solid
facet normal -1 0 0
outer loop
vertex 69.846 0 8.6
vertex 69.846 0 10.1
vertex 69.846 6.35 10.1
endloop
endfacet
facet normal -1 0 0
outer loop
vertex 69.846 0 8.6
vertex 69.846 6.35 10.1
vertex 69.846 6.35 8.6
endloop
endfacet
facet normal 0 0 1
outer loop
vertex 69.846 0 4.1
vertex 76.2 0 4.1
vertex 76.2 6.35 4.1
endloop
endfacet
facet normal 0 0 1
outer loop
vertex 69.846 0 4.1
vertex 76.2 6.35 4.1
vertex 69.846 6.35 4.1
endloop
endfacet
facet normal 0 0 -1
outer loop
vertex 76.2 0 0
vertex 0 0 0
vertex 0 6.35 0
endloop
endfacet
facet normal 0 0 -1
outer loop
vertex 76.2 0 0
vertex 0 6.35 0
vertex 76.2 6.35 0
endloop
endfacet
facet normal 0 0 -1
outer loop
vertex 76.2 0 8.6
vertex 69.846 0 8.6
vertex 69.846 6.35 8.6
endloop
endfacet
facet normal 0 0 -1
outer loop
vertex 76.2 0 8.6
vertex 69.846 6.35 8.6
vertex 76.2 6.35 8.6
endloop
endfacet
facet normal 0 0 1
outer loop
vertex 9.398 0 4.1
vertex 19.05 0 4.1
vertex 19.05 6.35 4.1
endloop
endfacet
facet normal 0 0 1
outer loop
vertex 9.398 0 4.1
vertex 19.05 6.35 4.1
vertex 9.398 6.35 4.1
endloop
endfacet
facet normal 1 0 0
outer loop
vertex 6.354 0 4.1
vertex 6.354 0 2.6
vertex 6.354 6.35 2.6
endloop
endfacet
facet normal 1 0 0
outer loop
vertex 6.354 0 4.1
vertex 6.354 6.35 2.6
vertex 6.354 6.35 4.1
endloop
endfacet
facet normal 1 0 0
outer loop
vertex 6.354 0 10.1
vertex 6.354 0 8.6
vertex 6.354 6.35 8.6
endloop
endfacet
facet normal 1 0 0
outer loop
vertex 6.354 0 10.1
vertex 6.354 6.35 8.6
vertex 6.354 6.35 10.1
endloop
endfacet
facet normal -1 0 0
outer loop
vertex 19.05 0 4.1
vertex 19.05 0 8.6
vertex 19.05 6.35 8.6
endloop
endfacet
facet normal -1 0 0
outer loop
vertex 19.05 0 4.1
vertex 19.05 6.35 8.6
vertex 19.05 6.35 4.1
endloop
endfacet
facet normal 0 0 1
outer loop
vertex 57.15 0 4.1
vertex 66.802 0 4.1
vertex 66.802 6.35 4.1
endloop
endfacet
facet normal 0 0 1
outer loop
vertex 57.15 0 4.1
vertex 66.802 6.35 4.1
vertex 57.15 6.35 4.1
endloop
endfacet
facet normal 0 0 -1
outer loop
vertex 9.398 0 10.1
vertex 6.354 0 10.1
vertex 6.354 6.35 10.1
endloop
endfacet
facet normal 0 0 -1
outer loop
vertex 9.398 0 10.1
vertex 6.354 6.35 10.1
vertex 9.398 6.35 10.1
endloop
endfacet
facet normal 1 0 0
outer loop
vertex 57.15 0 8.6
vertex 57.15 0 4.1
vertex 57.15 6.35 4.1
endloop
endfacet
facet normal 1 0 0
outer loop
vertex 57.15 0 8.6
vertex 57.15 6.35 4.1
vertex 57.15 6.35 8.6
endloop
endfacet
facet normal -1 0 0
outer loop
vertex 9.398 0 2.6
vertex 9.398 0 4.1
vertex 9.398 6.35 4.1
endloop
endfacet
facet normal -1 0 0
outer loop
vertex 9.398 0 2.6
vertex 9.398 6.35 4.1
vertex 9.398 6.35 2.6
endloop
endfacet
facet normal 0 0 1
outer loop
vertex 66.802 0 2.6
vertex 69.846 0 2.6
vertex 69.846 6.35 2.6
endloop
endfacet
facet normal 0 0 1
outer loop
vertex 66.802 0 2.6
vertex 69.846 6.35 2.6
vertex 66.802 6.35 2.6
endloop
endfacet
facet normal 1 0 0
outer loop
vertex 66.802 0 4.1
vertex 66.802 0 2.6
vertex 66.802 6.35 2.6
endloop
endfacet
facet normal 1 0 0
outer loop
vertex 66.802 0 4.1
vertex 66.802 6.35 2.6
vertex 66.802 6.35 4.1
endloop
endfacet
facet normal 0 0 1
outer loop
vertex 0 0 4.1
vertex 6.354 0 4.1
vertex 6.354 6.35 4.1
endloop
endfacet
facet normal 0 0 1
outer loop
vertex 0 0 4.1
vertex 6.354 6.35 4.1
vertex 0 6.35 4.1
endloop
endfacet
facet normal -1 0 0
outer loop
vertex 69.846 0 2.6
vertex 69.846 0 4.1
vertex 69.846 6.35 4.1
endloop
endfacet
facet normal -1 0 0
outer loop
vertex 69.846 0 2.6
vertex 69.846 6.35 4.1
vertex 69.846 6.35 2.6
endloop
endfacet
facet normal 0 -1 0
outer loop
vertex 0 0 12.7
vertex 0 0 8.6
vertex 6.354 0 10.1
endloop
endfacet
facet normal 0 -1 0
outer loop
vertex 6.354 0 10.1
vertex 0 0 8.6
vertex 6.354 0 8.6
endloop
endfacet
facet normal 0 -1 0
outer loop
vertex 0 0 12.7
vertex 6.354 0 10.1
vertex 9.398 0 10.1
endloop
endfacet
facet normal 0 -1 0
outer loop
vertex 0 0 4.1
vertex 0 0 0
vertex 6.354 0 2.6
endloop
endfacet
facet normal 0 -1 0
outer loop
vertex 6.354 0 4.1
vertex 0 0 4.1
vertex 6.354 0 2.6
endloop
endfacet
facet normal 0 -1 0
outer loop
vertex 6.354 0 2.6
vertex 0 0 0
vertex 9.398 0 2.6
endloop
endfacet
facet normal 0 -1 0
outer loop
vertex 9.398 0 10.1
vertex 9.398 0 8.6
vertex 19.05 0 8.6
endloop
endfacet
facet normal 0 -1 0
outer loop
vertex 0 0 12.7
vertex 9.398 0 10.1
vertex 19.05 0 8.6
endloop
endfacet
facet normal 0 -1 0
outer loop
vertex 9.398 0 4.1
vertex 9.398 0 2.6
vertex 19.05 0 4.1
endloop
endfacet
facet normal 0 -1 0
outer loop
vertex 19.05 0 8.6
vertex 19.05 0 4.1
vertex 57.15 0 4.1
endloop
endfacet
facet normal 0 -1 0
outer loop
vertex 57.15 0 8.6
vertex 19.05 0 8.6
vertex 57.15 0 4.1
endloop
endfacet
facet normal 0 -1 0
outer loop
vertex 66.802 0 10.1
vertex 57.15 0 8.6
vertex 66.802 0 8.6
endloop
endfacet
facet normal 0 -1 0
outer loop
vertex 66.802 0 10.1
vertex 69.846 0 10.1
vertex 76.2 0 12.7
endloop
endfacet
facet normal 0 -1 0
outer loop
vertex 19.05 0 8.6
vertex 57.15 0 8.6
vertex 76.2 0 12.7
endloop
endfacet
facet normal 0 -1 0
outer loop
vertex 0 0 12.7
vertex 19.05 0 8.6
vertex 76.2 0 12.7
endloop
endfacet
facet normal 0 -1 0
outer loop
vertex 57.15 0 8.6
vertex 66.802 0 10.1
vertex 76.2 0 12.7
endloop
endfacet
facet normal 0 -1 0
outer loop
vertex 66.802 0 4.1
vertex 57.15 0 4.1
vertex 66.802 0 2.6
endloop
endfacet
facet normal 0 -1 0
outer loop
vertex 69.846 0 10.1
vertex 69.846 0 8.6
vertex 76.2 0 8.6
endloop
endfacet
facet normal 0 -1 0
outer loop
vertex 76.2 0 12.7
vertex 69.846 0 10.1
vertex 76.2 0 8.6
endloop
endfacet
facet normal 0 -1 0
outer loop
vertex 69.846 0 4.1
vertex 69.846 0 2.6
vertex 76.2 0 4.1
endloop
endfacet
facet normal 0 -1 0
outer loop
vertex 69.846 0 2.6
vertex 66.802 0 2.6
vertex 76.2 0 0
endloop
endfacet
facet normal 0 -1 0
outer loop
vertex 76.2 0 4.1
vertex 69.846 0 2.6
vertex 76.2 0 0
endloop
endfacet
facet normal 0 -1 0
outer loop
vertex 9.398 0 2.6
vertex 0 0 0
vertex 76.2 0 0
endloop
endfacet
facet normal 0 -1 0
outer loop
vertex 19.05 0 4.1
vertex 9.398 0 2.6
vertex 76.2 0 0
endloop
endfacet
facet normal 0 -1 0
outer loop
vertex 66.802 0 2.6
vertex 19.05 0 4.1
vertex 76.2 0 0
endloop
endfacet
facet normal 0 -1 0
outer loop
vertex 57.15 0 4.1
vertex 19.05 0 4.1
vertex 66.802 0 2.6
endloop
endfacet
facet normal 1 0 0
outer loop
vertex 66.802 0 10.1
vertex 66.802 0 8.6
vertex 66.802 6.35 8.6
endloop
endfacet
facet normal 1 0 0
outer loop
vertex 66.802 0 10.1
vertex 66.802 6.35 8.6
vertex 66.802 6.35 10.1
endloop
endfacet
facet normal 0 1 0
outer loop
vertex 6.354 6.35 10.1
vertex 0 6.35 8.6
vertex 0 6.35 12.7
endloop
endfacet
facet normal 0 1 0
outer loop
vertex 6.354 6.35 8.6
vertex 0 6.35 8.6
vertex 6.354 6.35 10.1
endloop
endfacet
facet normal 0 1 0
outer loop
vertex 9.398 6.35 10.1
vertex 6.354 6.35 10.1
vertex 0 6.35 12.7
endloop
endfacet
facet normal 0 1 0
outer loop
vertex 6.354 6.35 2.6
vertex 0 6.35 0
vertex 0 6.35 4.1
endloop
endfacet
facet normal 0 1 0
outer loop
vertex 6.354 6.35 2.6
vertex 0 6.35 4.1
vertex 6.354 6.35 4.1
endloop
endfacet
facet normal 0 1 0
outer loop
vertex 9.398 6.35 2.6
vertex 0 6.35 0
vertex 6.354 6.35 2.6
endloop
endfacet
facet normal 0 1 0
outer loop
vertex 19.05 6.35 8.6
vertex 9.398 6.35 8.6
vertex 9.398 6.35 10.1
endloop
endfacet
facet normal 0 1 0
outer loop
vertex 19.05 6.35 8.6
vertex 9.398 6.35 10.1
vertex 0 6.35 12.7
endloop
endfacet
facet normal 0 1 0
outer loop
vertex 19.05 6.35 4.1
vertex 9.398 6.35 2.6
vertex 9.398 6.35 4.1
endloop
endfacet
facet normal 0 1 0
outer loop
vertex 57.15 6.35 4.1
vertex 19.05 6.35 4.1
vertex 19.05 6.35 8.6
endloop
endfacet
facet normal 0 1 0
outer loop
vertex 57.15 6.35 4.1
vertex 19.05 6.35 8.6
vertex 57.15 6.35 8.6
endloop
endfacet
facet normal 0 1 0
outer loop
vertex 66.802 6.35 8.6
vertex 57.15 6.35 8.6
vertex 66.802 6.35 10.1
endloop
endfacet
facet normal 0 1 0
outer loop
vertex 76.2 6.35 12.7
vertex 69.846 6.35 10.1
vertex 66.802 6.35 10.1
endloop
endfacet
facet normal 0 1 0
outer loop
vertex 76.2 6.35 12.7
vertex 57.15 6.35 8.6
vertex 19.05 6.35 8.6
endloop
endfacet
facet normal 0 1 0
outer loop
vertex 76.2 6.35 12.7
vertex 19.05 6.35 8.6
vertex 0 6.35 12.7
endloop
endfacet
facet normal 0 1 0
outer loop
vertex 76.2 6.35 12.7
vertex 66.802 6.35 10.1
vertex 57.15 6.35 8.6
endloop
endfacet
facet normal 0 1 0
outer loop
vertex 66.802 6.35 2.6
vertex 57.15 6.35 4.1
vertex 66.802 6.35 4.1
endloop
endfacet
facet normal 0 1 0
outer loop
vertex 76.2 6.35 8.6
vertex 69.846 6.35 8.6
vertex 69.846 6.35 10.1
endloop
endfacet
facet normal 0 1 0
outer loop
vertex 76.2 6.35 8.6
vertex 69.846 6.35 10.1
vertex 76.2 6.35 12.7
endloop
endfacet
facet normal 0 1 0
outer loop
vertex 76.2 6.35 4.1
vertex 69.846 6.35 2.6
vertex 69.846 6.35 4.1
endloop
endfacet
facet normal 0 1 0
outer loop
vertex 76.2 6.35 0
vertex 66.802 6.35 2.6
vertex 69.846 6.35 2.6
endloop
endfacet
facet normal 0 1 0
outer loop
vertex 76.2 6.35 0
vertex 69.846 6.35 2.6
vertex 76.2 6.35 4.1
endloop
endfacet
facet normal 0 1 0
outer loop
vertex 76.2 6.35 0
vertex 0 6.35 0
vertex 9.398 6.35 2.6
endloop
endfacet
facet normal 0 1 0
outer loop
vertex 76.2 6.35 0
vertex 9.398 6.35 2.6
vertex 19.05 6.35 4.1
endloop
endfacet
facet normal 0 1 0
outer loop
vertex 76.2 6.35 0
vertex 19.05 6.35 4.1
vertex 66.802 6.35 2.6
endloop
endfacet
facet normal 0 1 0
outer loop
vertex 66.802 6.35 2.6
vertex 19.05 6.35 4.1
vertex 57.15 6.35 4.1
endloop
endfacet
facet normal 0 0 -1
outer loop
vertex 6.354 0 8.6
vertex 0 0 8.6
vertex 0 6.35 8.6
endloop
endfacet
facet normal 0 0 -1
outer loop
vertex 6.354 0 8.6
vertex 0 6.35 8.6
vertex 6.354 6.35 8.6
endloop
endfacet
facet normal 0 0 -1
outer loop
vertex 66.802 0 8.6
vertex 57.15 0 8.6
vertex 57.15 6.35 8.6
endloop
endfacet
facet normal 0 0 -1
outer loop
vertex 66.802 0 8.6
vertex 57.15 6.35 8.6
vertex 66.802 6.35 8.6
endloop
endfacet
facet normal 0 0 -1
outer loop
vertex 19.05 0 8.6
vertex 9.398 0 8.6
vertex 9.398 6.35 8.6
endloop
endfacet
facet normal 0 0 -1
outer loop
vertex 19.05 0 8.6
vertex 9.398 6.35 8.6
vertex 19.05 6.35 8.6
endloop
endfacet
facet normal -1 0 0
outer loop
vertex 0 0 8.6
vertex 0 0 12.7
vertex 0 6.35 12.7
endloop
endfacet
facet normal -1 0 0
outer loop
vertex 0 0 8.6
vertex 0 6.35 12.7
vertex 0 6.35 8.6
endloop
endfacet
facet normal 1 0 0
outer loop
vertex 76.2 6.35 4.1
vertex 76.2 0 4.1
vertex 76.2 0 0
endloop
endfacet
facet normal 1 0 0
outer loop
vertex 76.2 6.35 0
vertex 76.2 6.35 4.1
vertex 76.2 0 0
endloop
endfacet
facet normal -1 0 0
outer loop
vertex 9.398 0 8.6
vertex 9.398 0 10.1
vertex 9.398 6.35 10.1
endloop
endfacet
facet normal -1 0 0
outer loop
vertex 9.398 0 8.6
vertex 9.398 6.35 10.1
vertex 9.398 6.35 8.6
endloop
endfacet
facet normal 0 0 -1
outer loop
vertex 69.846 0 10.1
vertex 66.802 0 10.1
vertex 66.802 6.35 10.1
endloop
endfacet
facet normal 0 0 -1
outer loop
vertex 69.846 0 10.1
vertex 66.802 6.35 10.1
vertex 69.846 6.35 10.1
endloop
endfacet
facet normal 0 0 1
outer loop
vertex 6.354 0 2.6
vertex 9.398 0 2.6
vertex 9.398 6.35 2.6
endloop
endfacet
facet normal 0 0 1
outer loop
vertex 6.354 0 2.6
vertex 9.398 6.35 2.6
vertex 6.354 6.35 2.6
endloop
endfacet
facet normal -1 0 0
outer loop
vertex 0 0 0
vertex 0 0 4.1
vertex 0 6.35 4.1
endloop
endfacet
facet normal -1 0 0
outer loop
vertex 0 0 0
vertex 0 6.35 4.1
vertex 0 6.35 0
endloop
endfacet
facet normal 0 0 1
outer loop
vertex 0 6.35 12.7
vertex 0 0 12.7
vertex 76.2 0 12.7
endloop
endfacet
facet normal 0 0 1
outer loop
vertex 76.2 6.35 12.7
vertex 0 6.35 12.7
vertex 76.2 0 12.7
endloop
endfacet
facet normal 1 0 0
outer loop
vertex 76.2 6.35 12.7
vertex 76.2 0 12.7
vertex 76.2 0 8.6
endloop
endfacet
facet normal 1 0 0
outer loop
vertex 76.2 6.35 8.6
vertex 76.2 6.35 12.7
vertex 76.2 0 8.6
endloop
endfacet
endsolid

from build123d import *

# Parameters (mm, degrees)
SKETCH1_W               = 76.2
SKETCH1_H               = 12.7
BOSS_EXTRUDE1_DEPTH     = 6.35
CUT_EXTRUDE1_DEPTH      = 1
CUT_EXTRUDE1_DEPTH_BACK = 7.35


with BuildPart() as part:
    # Sketch1 → Boss-Extrude1 (new body)
    with BuildSketch(Plane(origin=(0, 0, 0), x_dir=(1, 0, 0), z_dir=(0, 1, 0))):
        with Locations((38.1, -6.35)):
            Rectangle(SKETCH1_W, SKETCH1_H)
    extrude(amount=BOSS_EXTRUDE1_DEPTH)

    # Sketch2 → Cut-Extrude1 (cut, two sides)
    with BuildSketch(Plane(origin=(0, 0, 0), x_dir=(-1, 0, 0), z_dir=(0, -1, 0))) as cut_extrude1_sk:
        Polygon((-76.2, -8.6), (-76.2, -4.1), (-69.845872794, -4.1), (-69.845872794, -2.6), (-66.802, -2.6), (-66.802, -4.1), (-57.149530135, -4.1), (-57.149530135, -8.6), (-66.802, -8.6), (-66.802, -10.1), (-69.845872794, -10.1), (-69.845872794, -8.6), align=None)
        Polygon((-19.050469865, -4.1), (-9.398, -4.1), (-9.398, -2.6), (-6.354127206, -2.6), (-6.354127206, -4.1), (0, -4.1), (0, -8.6), (-6.354127206, -8.6), (-6.354127206, -10.1), (-9.398, -10.1), (-9.398, -8.6), (-19.050469865, -8.6), align=None)
    extrude(amount=CUT_EXTRUDE1_DEPTH, mode=Mode.SUBTRACT)
    extrude(cut_extrude1_sk.sketch, amount=-CUT_EXTRUDE1_DEPTH_BACK, mode=Mode.SUBTRACT)


solid = part.part
